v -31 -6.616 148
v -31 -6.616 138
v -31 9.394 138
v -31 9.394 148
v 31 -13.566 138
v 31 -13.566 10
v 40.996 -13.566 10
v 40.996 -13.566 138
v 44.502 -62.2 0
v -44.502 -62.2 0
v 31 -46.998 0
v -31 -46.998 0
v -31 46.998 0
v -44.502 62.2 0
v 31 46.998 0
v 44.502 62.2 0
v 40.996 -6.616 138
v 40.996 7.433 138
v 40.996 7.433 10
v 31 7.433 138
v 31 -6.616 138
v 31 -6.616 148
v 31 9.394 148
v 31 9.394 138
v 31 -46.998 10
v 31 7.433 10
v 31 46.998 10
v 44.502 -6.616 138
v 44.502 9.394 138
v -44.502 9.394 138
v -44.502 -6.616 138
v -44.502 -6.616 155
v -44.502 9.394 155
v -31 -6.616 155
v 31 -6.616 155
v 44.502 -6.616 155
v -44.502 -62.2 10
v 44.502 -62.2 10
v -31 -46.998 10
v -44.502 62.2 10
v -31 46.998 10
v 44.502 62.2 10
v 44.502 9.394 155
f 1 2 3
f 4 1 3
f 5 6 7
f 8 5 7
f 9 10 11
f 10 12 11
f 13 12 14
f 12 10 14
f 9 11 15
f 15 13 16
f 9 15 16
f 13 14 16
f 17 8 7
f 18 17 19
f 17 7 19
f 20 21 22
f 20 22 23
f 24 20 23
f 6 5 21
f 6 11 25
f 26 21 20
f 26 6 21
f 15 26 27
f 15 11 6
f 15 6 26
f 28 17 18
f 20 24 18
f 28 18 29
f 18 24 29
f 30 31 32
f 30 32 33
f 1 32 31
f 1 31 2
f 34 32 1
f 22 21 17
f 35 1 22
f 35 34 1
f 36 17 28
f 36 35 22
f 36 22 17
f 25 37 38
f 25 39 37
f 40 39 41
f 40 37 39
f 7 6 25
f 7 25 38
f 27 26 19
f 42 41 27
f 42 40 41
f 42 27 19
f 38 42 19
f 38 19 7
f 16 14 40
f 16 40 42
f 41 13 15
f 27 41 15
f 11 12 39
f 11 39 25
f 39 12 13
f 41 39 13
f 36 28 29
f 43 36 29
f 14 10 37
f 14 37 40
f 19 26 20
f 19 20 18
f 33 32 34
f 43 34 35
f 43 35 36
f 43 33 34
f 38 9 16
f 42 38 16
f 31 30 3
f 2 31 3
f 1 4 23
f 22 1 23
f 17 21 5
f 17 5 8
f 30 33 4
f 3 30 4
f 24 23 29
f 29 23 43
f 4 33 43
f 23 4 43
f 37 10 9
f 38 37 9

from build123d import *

# Parameters (mm, degrees)
SKETCH1_W           = 89.004906374
SKETCH1_H           = 124.399859706
SKETCH1_W_2         = 61.999445932
SKETCH1_H_2         = 93.995967372
BOSS_EXTRUDE1_DEPTH = 10
SKETCH2_W           = 9.996534877
SKETCH2_H           = 20.999060591
BOSS_EXTRUDE2_DEPTH = 128
SKETCH3_W           = 89.004906374
SKETCH3_H           = 124.399859706
SKETCH3_W_2         = 61.999445932
SKETCH3_H_2         = 93.995967372
BOSS_EXTRUDE3_DEPTH = 17
SKETCH4_W           = 61.999445932
SKETCH4_H           = 16.009834455
BOSS_EXTRUDE4_DEPTH = 7
SKETCH5_W           = 89.004906374
SKETCH5_H           = 55.583620716
SKETCH5_H_2         = 52.806404535
CUT_EXTRUDE1_DEPTH  = 17


with BuildPart() as part:
    # Sketch1 → Boss-Extrude1 (new body)
    with BuildSketch(Plane.XY):
        Rectangle(SKETCH1_W, SKETCH1_H)
        Rectangle(SKETCH1_W_2, SKETCH1_H_2, mode=Mode.SUBTRACT)
    extrude(amount=BOSS_EXTRUDE1_DEPTH)

    # Sketch2 → Boss-Extrude2 (add)
    with BuildSketch(Plane.XY.offset(10)):
        with Locations((35.997990405, -3.066392871)):
            Rectangle(SKETCH2_W, SKETCH2_H)
    extrude(amount=BOSS_EXTRUDE2_DEPTH)

    # Sketch3 → Boss-Extrude3 (add)
    with BuildSketch(Plane.XY.offset(138)):
        Rectangle(SKETCH3_W, SKETCH3_H)
        Rectangle(SKETCH3_W_2, SKETCH3_H_2, mode=Mode.SUBTRACT)
    extrude(amount=BOSS_EXTRUDE3_DEPTH)

    # Sketch4 → Boss-Extrude4 (add)
    with BuildSketch(Plane.XY.offset(155)):
        with Locations((0, 1.388608091)):
            Rectangle(SKETCH4_W, SKETCH4_H)
    extrude(amount=-BOSS_EXTRUDE4_DEPTH)

    # Sketch5 → Cut-Extrude1 (cut)
    with BuildSketch(Plane.XY.offset(155)):
        with Locations((0, -34.408119495)):
            Rectangle(SKETCH5_W, SKETCH5_H)
        with Locations((0, 35.796727586)):
            Rectangle(SKETCH5_W, SKETCH5_H_2)
    extrude(amount=-CUT_EXTRUDE1_DEPTH, mode=Mode.SUBTRACT)


solid = part.part
